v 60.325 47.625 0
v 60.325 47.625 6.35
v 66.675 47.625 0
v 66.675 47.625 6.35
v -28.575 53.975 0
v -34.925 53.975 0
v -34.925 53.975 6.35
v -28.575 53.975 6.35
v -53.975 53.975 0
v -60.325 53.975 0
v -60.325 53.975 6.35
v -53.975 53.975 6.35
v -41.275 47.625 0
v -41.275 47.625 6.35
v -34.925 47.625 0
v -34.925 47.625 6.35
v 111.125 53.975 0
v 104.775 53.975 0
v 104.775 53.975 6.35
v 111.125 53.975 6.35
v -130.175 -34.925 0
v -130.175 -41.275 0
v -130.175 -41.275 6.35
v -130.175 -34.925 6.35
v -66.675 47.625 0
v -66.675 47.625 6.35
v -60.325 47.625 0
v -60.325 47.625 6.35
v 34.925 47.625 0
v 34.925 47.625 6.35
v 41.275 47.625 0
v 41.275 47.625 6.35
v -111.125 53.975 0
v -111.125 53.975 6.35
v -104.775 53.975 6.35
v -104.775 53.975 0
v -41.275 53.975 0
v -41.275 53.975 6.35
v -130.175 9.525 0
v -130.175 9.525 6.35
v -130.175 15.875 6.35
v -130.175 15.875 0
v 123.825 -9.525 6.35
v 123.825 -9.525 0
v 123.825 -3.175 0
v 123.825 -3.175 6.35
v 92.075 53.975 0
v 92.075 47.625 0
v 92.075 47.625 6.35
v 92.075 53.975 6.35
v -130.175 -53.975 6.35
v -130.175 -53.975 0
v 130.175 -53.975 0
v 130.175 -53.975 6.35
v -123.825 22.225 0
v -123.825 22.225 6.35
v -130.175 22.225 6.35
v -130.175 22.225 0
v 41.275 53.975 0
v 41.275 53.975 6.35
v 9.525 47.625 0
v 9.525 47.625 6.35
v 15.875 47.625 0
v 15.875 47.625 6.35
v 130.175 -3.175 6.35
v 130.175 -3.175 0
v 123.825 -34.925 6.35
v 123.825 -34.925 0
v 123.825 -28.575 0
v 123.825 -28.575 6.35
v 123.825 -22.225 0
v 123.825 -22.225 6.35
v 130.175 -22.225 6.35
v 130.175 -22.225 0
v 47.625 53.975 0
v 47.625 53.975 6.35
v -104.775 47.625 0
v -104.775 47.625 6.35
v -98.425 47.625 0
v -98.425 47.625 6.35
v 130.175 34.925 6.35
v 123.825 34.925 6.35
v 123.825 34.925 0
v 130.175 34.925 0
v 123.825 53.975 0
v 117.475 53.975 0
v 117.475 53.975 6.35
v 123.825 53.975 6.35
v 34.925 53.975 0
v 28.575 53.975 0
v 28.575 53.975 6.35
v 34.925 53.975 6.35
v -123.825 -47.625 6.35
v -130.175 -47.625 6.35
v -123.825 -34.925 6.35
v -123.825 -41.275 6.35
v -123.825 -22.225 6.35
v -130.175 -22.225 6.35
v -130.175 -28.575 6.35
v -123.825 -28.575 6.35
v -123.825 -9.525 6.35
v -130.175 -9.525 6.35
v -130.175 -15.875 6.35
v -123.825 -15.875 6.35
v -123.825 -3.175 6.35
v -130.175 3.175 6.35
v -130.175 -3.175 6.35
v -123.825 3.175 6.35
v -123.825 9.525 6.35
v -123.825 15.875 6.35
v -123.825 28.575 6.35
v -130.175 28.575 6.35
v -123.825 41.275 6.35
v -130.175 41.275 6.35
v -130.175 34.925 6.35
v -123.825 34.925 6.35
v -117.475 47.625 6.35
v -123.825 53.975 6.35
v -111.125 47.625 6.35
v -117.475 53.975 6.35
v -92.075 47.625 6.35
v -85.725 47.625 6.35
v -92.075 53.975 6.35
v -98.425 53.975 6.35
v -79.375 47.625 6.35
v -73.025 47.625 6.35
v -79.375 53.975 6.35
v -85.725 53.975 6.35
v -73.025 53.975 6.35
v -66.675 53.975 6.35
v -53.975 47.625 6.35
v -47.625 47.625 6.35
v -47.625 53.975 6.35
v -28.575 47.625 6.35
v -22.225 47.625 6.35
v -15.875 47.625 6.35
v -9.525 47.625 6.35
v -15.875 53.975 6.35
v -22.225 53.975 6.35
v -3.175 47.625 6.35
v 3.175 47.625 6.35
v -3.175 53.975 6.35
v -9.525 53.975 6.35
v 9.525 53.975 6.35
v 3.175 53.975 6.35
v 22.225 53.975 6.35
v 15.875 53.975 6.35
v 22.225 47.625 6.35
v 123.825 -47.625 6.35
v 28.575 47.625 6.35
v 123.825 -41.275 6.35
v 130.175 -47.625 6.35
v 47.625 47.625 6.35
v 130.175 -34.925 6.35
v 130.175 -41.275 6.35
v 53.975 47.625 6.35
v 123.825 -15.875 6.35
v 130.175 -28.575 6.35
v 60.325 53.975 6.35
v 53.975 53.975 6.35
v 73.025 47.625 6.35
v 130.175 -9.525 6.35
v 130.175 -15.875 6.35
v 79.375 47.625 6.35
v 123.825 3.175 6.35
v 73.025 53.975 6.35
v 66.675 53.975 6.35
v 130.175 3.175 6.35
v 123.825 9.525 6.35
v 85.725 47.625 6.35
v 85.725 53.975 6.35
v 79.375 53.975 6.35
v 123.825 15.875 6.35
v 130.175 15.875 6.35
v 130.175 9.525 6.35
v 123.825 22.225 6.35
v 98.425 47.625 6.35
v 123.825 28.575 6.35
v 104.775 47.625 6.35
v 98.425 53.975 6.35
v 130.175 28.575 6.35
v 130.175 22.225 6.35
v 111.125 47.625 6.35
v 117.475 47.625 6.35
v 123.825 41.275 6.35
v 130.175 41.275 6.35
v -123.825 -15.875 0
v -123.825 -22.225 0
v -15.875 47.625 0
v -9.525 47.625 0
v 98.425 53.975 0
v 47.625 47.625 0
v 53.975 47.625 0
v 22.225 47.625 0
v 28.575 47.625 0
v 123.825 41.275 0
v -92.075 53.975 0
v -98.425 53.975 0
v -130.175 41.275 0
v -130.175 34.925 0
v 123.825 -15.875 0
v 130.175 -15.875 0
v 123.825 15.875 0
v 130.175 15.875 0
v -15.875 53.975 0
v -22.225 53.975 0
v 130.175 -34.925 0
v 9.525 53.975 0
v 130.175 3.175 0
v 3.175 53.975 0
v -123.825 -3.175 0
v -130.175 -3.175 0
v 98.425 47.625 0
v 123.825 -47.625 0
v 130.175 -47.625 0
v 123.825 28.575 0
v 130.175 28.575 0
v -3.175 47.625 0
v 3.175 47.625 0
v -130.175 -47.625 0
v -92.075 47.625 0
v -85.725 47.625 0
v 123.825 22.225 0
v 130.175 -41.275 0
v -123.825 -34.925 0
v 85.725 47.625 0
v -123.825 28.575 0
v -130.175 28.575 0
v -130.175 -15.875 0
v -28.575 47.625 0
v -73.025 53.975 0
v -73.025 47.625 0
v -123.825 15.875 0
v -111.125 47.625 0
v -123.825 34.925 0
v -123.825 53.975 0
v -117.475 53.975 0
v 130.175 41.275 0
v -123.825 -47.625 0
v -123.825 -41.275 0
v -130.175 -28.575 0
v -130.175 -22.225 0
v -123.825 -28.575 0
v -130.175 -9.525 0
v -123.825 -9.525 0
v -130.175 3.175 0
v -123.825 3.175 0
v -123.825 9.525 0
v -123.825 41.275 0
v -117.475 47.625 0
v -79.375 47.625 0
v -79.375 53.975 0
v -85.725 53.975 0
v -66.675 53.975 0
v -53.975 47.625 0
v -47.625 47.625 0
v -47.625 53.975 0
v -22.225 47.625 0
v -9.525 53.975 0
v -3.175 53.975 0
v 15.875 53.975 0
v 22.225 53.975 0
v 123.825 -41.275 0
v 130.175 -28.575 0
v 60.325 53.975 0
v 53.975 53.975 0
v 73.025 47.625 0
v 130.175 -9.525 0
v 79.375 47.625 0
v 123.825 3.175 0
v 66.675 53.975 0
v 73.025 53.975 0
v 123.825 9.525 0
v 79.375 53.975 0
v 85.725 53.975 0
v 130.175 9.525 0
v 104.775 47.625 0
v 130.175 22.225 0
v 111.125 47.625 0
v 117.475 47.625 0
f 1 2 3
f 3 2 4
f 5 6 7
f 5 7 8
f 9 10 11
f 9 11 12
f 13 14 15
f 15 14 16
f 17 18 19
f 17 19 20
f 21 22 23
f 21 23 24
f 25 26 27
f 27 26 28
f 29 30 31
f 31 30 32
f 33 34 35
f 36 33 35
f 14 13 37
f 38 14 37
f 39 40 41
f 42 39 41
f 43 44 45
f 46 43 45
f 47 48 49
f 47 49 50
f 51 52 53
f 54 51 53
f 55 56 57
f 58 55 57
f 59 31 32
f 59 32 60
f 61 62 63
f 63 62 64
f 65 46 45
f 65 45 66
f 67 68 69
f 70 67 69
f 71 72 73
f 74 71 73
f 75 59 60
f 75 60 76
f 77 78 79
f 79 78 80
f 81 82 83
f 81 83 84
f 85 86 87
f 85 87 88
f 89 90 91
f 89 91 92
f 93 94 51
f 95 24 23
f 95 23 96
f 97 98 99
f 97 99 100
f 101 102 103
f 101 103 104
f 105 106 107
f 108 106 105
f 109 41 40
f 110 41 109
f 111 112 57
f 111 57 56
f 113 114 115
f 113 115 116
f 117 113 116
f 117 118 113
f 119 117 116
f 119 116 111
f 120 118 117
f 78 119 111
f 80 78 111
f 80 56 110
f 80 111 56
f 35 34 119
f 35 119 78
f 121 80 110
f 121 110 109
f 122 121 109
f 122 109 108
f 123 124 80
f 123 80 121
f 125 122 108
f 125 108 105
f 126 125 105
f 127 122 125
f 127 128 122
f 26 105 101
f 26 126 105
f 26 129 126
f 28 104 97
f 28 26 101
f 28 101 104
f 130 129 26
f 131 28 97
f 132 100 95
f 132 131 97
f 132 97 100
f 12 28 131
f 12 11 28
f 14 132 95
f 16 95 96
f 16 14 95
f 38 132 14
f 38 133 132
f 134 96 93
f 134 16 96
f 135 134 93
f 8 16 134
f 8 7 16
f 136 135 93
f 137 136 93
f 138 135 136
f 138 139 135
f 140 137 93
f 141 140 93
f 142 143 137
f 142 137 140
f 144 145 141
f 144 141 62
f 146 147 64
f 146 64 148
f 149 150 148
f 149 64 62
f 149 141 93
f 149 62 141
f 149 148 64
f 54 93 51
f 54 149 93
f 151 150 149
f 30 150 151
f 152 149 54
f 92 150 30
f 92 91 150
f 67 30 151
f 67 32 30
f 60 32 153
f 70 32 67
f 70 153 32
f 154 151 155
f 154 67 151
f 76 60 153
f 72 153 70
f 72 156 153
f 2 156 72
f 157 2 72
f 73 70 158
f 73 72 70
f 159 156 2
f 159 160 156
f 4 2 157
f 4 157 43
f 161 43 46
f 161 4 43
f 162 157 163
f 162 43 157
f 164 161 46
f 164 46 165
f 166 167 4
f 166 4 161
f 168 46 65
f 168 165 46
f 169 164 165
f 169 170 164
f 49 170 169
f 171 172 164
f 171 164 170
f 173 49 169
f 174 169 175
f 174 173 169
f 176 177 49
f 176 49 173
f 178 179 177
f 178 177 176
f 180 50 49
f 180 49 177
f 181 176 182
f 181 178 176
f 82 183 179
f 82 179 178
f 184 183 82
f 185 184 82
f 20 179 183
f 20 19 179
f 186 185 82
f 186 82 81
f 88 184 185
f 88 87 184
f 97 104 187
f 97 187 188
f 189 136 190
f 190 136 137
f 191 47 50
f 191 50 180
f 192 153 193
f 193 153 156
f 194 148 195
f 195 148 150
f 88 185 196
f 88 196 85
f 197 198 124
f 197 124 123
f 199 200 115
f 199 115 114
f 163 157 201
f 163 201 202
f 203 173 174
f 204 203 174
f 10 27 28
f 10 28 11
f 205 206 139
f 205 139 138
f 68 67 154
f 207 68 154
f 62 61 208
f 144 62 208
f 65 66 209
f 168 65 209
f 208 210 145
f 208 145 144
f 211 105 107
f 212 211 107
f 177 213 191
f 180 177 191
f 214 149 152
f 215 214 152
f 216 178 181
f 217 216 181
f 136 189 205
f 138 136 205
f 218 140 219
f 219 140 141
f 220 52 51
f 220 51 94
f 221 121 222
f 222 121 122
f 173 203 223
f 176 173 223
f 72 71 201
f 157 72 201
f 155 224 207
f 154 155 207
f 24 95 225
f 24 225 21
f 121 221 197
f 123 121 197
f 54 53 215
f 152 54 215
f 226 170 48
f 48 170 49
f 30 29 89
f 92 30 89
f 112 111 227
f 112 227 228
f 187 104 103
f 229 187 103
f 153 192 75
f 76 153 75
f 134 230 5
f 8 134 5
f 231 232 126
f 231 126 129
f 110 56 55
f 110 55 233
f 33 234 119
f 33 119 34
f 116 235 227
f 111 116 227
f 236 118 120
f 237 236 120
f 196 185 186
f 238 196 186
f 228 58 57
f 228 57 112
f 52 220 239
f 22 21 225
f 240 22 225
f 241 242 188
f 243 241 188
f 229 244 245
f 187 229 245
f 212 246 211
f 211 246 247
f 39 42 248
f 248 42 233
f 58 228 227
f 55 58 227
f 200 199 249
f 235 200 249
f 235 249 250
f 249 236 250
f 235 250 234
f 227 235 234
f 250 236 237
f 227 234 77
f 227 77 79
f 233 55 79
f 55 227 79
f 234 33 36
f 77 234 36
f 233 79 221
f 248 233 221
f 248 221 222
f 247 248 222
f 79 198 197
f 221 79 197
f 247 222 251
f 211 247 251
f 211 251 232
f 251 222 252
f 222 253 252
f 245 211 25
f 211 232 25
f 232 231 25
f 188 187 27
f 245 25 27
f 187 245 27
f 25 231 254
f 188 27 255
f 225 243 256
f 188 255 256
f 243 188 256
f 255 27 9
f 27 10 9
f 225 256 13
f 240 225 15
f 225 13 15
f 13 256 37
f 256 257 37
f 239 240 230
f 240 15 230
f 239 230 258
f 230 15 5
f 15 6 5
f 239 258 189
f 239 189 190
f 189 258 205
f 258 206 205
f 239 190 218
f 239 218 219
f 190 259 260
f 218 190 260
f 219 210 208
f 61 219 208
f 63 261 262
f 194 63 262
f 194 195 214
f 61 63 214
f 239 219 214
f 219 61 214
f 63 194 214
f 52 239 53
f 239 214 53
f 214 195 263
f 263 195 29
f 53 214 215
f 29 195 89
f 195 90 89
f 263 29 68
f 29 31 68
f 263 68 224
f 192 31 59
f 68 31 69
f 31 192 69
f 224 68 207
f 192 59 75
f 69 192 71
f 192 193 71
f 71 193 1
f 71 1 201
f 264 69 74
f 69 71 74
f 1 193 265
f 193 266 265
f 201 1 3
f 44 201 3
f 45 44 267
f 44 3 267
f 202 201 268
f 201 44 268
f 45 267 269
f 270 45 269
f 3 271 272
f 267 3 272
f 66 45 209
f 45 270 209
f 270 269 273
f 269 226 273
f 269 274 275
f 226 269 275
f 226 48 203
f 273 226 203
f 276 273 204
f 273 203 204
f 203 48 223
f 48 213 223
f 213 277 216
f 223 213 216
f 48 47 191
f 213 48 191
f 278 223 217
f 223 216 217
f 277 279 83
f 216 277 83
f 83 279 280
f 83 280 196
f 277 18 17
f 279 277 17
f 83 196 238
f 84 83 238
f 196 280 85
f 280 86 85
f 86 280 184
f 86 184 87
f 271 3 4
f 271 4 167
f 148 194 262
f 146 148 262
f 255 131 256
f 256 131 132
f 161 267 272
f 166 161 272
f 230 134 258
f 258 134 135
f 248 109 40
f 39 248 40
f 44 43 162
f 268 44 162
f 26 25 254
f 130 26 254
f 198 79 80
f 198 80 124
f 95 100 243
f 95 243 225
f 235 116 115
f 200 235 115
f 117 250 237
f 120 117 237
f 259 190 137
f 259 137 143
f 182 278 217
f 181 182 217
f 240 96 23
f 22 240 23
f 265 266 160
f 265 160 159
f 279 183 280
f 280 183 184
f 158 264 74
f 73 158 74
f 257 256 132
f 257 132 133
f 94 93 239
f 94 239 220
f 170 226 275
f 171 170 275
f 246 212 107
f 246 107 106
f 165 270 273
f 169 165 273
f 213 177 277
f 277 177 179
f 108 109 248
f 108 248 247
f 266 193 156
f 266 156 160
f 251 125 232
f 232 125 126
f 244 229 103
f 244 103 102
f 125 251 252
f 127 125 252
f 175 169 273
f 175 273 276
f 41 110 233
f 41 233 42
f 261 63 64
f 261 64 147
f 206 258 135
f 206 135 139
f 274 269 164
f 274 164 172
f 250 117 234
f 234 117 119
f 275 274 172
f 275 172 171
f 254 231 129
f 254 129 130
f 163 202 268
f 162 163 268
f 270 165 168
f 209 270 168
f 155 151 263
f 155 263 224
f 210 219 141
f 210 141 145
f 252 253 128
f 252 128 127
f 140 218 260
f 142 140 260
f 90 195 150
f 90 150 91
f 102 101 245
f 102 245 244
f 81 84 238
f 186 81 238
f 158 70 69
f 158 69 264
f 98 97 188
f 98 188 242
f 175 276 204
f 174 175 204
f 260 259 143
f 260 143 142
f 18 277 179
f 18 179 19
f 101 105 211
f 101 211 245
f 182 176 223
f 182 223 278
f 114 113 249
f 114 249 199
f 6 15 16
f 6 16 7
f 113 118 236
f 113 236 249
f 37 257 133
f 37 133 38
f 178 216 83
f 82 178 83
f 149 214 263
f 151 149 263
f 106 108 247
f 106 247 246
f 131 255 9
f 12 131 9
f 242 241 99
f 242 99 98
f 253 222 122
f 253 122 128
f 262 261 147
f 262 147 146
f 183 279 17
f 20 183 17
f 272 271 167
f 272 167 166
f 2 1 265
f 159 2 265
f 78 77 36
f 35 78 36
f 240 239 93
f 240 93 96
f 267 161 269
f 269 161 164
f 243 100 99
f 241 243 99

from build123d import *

# Parameters (mm, degrees)
SKETCH1_W               = 260.35
SKETCH1_H               = 107.95
BOSS_EXTRUDE1_DEPTH     = 6.35
SKETCH3_W               = 6.35
SKETCH3_H               = 6.35
CUT_EXTRUDE1_DEPTH      = 7.35
LPATTERN1_COUNT         = 8
LPATTERN1_PITCH         = 12.7
MIRROR1_COPY_1_SKETCH_W = 6.35
MIRROR1_COPY_1_SKETCH_H = 6.35
MIRROR1_COPY_1_DEPTH    = 7.35
MIRROR1_COPY_2_SKETCH_W = 6.35
MIRROR1_COPY_2_SKETCH_H = 6.35
MIRROR1_COPY_2_DEPTH    = 7.35
MIRROR1_COPY_3_SKETCH_W = 6.35
MIRROR1_COPY_3_SKETCH_H = 6.35
MIRROR1_COPY_3_DEPTH    = 7.35
MIRROR1_COPY_4_SKETCH_W = 6.35
MIRROR1_COPY_4_SKETCH_H = 6.35
MIRROR1_COPY_4_DEPTH    = 7.35
MIRROR1_COPY_5_SKETCH_W = 6.35
MIRROR1_COPY_5_SKETCH_H = 6.35
MIRROR1_COPY_5_DEPTH    = 7.35
MIRROR1_COPY_6_SKETCH_W = 6.35
MIRROR1_COPY_6_SKETCH_H = 6.35
MIRROR1_COPY_6_DEPTH    = 7.35
MIRROR1_COPY_7_SKETCH_W = 6.35
MIRROR1_COPY_7_SKETCH_H = 6.35
MIRROR1_COPY_7_DEPTH    = 7.35
SKETCH4_W               = 6.35
SKETCH4_H               = 6.35
CUT_EXTRUDE2_DEPTH      = 6.35
LPATTERN2_COUNT         = 21
LPATTERN2_PITCH         = 12.7


with BuildPart() as part:
    # Sketch1 → Boss-Extrude1 (new body)
    with BuildSketch(Plane.XY):
        Rectangle(SKETCH1_W, SKETCH1_H)
    extrude(amount=BOSS_EXTRUDE1_DEPTH)

    # Sketch3 → Cut-Extrude1 (cut, through all)
    with BuildSketch(Plane.XY.offset(6.35)):
        with Locations((127, -44.45)):
            Rectangle(SKETCH3_W, SKETCH3_H)
    cut_extrude1 = extrude(amount=-CUT_EXTRUDE1_DEPTH, mode=Mode.SUBTRACT)

    # LPattern1: Cut-Extrude1 ×8
    with Locations(*[(0, i * LPATTERN1_PITCH, 0) for i in range(1, LPATTERN1_COUNT)]):
        add(cut_extrude1, mode=Mode.SUBTRACT)

    # Mirror1: Cut-Extrude1 across plane
    add(cut_extrude1.mirror(Plane(origin=(0, 0, 0), x_dir=(0, 0, 1), z_dir=(1, 0, 0))), mode=Mode.SUBTRACT)

    # Mirror1 copy 1 sketch → Mirror1 copy 1 (cut, through all)
    with BuildSketch(Plane(origin=(0, 12.7, 6.35), x_dir=(-1, 0, 0), z_dir=(0, 0, 1))):
        with Locations((127, 44.45)):
            Rectangle(MIRROR1_COPY_1_SKETCH_W, MIRROR1_COPY_1_SKETCH_H)
    extrude(amount=-MIRROR1_COPY_1_DEPTH, mode=Mode.SUBTRACT)

    # Mirror1 copy 2 sketch → Mirror1 copy 2 (cut, through all)
    with BuildSketch(Plane(origin=(0, 25.4, 6.35), x_dir=(-1, 0, 0), z_dir=(0, 0, 1))):
        with Locations((127, 44.45)):
            Rectangle(MIRROR1_COPY_2_SKETCH_W, MIRROR1_COPY_2_SKETCH_H)
    extrude(amount=-MIRROR1_COPY_2_DEPTH, mode=Mode.SUBTRACT)

    # Mirror1 copy 3 sketch → Mirror1 copy 3 (cut, through all)
    with BuildSketch(Plane(origin=(0, 38.1, 6.35), x_dir=(-1, 0, 0), z_dir=(0, 0, 1))):
        with Locations((127, 44.45)):
            Rectangle(MIRROR1_COPY_3_SKETCH_W, MIRROR1_COPY_3_SKETCH_H)
    extrude(amount=-MIRROR1_COPY_3_DEPTH, mode=Mode.SUBTRACT)

    # Mirror1 copy 4 sketch → Mirror1 copy 4 (cut, through all)
    with BuildSketch(Plane(origin=(0, 50.8, 6.35), x_dir=(-1, 0, 0), z_dir=(0, 0, 1))):
        with Locations((127, 44.45)):
            Rectangle(MIRROR1_COPY_4_SKETCH_W, MIRROR1_COPY_4_SKETCH_H)
    extrude(amount=-MIRROR1_COPY_4_DEPTH, mode=Mode.SUBTRACT)

    # Mirror1 copy 5 sketch → Mirror1 copy 5 (cut, through all)
    with BuildSketch(Plane(origin=(0, 63.5, 6.35), x_dir=(-1, 0, 0), z_dir=(0, 0, 1))):
        with Locations((127, 44.45)):
            Rectangle(MIRROR1_COPY_5_SKETCH_W, MIRROR1_COPY_5_SKETCH_H)
    extrude(amount=-MIRROR1_COPY_5_DEPTH, mode=Mode.SUBTRACT)

    # Mirror1 copy 6 sketch → Mirror1 copy 6 (cut, through all)
    with BuildSketch(Plane(origin=(0, 76.2, 6.35), x_dir=(-1, 0, 0), z_dir=(0, 0, 1))):
        with Locations((127, 44.45)):
            Rectangle(MIRROR1_COPY_6_SKETCH_W, MIRROR1_COPY_6_SKETCH_H)
    extrude(amount=-MIRROR1_COPY_6_DEPTH, mode=Mode.SUBTRACT)

    # Mirror1 copy 7 sketch → Mirror1 copy 7 (cut, through all)
    with BuildSketch(Plane(origin=(0, 88.9, 6.35), x_dir=(-1, 0, 0), z_dir=(0, 0, 1))):
        with Locations((127, 44.45)):
            Rectangle(MIRROR1_COPY_7_SKETCH_W, MIRROR1_COPY_7_SKETCH_H)
    extrude(amount=-MIRROR1_COPY_7_DEPTH, mode=Mode.SUBTRACT)

    # Sketch4 → Cut-Extrude2 (cut)
    with BuildSketch(Plane.XY.offset(6.35)):
        with Locations((-127, 50.8)):
            Rectangle(SKETCH4_W, SKETCH4_H)
    cut_extrude2 = extrude(amount=-CUT_EXTRUDE2_DEPTH, mode=Mode.SUBTRACT)

    # LPattern2: Cut-Extrude2 ×21
    with Locations(*[(i * LPATTERN2_PITCH, 0, 0) for i in range(1, LPATTERN2_COUNT)]):
        add(cut_extrude2, mode=Mode.SUBTRACT)


solid = part.part
